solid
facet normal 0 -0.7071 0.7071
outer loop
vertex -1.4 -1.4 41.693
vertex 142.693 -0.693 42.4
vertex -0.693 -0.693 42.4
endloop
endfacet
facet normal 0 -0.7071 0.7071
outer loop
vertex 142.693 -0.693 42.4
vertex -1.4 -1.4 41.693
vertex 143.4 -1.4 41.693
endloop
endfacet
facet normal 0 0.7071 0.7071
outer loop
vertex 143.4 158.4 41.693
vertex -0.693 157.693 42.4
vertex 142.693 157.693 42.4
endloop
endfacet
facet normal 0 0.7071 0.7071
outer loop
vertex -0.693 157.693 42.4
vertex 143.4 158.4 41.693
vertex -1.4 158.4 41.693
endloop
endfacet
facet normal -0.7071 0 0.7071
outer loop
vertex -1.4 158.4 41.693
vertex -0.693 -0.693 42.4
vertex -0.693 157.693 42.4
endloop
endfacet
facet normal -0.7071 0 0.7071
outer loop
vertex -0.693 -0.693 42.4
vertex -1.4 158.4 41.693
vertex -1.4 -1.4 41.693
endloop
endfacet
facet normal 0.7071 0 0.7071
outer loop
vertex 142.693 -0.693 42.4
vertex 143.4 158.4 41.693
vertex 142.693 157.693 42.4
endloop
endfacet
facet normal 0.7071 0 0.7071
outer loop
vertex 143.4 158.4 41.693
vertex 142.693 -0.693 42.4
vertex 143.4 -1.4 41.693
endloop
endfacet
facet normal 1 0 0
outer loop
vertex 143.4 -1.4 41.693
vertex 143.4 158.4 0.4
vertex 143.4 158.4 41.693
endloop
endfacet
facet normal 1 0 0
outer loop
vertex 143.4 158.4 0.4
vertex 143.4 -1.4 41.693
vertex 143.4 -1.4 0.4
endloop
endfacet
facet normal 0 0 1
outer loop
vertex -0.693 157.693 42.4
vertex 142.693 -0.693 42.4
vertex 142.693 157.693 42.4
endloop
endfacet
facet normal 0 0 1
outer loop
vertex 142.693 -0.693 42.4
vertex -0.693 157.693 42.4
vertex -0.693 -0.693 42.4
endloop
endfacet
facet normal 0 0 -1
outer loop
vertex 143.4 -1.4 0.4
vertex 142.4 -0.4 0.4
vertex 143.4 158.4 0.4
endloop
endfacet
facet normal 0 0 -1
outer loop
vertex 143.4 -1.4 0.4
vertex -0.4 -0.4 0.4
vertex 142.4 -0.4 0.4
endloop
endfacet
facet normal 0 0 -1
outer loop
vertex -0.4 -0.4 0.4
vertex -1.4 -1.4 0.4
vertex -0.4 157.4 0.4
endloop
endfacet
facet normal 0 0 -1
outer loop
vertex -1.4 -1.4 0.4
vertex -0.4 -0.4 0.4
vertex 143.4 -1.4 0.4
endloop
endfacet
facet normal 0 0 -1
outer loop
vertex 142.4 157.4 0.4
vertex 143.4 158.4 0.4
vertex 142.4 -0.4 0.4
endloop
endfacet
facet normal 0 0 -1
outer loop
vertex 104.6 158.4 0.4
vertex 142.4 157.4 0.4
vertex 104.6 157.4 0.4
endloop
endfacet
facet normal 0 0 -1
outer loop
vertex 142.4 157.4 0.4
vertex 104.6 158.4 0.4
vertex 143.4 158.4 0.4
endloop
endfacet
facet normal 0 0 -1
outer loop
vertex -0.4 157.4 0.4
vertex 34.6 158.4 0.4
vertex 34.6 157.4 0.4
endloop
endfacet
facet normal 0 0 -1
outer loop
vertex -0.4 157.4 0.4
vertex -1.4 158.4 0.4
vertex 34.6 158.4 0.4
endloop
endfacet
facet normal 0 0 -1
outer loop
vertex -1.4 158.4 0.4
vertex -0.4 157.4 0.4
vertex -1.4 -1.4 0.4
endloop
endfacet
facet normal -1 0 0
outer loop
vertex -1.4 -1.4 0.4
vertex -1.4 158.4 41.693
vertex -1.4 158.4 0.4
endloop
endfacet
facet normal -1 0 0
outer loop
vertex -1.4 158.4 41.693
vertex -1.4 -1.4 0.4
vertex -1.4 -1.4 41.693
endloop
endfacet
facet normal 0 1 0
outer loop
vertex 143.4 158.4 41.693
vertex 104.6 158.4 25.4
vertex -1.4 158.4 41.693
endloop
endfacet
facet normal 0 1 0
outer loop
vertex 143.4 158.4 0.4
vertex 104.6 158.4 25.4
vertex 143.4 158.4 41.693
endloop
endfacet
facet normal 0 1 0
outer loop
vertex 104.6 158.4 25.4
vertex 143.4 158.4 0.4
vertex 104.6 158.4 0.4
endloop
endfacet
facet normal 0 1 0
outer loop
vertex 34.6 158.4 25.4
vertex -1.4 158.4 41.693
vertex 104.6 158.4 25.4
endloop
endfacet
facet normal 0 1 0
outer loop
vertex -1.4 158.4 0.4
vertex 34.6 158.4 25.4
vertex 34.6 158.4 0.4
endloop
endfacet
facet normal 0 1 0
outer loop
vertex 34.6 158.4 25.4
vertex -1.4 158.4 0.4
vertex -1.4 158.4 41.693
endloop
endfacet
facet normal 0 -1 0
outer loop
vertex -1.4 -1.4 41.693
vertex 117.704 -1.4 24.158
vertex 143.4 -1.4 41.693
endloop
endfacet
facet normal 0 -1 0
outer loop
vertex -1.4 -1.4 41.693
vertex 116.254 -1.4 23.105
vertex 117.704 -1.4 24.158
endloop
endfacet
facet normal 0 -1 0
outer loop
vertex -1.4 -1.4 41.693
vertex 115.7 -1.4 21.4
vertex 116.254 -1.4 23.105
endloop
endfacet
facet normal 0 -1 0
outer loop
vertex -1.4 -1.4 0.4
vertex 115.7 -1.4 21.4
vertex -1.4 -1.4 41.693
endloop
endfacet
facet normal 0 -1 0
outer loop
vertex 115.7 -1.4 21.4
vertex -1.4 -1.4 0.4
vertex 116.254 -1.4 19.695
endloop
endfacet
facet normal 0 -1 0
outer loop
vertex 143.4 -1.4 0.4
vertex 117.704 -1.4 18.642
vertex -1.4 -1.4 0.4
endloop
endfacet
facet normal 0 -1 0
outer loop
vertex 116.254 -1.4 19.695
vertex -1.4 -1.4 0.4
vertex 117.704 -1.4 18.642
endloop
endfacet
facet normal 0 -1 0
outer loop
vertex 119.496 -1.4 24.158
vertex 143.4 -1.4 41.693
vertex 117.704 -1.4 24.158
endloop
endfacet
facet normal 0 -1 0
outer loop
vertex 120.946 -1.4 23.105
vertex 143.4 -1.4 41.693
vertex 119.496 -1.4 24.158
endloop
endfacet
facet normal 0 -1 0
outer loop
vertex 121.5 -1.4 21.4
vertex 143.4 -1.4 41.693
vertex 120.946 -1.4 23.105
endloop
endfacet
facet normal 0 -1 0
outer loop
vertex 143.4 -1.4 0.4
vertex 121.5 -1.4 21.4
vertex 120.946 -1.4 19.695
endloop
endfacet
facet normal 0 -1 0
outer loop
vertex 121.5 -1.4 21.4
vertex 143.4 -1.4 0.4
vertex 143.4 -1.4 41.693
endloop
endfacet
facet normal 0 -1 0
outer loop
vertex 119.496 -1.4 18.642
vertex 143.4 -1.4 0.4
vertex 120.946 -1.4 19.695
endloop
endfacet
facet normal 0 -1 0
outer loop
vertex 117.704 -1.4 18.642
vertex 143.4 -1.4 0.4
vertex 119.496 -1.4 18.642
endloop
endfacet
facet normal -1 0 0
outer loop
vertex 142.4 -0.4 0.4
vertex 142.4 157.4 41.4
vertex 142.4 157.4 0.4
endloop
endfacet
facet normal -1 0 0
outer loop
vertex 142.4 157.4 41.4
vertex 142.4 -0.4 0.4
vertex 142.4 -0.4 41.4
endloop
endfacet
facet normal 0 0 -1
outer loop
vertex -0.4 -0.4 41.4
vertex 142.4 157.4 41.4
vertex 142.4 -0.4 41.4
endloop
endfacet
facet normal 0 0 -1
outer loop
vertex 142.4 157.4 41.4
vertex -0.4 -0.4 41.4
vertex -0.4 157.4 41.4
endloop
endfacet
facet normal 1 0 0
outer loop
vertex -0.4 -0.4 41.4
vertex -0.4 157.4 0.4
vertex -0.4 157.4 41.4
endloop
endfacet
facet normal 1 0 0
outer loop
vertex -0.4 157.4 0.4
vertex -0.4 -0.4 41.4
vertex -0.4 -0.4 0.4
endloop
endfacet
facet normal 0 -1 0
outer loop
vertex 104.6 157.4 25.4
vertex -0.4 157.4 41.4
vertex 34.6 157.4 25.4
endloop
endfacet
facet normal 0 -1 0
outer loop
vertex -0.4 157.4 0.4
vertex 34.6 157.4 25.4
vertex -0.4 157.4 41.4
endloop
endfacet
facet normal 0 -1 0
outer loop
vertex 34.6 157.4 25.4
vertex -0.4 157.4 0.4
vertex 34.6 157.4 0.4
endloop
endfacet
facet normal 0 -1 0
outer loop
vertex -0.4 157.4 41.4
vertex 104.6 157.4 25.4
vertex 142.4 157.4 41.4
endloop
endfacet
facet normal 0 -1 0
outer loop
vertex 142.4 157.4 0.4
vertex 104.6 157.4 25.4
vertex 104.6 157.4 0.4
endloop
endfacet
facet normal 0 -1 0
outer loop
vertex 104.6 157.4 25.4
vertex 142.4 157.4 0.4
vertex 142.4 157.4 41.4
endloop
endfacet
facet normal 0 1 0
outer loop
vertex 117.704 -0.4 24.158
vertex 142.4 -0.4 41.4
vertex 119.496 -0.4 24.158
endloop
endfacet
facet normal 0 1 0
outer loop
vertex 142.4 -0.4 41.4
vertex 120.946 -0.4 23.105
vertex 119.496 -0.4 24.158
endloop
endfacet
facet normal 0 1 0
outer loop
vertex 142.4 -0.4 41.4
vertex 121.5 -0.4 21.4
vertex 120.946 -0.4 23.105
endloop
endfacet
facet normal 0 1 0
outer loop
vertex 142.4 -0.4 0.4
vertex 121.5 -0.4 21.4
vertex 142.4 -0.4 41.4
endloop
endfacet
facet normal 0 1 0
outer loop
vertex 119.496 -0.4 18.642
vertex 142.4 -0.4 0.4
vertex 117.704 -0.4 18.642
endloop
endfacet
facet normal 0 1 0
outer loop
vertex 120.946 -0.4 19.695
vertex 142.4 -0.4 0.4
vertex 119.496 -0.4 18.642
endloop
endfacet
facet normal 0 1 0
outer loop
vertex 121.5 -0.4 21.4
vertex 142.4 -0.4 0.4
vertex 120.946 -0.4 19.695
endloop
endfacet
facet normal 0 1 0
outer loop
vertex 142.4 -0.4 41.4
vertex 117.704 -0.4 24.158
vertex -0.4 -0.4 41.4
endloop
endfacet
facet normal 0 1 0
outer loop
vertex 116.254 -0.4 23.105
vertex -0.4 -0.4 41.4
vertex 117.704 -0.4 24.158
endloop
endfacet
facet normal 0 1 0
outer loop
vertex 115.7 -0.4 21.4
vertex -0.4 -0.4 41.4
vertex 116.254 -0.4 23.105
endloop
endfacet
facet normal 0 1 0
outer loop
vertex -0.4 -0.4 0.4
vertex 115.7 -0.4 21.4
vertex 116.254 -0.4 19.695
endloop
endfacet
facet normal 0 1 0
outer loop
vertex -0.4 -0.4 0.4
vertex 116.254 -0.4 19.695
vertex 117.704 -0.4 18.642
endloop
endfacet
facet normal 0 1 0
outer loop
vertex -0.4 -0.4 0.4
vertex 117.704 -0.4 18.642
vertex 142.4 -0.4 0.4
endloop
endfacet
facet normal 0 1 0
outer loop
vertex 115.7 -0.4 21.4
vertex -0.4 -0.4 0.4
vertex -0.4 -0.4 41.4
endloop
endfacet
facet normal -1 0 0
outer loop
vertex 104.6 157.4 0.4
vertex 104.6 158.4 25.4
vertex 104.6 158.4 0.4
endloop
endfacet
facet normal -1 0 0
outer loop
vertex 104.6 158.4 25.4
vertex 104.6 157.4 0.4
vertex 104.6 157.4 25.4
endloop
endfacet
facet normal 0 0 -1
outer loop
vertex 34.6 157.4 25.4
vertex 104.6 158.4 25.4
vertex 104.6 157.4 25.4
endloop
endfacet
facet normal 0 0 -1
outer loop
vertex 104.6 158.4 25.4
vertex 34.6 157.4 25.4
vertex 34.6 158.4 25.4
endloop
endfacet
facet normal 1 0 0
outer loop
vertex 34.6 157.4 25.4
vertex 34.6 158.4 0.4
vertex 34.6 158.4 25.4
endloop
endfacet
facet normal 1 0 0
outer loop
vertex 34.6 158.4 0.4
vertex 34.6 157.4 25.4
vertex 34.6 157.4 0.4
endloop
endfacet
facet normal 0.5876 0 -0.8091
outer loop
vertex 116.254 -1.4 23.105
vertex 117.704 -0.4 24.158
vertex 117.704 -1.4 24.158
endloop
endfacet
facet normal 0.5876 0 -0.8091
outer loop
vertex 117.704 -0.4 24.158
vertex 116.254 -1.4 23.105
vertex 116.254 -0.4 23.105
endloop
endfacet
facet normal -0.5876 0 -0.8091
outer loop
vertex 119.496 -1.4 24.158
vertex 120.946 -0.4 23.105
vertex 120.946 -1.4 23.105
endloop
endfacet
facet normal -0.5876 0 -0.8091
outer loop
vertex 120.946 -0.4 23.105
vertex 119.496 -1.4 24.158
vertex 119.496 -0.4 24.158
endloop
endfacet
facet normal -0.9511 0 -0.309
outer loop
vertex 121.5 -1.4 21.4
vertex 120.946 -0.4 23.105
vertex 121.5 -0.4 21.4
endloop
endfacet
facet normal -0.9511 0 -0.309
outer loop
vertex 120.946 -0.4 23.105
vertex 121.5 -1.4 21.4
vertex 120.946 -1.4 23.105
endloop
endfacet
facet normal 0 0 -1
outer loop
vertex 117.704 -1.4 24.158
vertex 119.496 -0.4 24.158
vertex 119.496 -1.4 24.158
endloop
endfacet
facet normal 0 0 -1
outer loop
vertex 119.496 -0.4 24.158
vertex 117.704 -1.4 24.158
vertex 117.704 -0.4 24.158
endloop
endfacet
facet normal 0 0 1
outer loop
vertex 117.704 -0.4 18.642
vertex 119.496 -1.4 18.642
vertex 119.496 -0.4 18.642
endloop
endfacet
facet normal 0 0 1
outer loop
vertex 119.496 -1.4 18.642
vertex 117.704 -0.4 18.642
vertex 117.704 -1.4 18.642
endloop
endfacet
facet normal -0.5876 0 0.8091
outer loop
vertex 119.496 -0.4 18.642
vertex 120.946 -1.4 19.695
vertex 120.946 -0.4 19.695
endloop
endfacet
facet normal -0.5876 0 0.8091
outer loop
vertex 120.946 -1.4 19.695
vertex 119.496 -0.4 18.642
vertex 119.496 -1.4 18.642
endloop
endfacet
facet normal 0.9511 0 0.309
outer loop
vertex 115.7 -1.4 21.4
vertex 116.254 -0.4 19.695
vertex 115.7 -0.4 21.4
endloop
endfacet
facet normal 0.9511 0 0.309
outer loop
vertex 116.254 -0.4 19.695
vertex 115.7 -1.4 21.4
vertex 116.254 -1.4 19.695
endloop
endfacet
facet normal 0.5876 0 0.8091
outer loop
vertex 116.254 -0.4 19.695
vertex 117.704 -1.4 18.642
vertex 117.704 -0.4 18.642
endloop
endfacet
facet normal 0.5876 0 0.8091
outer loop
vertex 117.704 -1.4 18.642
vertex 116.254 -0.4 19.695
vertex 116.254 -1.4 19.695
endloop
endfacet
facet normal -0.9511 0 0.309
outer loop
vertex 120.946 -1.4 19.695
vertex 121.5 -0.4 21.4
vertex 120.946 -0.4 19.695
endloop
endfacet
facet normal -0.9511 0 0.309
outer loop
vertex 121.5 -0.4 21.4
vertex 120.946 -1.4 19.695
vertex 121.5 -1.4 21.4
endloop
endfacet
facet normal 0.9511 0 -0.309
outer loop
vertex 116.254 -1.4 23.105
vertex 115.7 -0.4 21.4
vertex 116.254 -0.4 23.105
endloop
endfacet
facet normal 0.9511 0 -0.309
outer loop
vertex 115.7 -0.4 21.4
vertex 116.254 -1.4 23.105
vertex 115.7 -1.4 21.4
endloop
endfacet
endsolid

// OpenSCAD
// [FL_INDEX: keywords="openscad, 3d_parametric, Free_Range_Printer_Raspberry_Pi_Box, csg_solid" | COT="Parametric OpenSCAD design from 3DCodeverse"]
// Title: Free Range Printer Raspberry Pi Box

// Rasperry Pi Free Range / Epson TM-T88 printer stand
//
// Box for holding Raspberry Pi under an Epson TM-T88 receipt printer or similar
// Customizable.
//
// (c) 2014, Laird Popkin laird@popk.in
//


/* [Hidden] */

piWidth = 56;
piLen = 85;
piHeight = 20;
piStandHeight = 5;
piThick = 2;

screwD = 2.9;
screwR = screwD/2;
standR = screwR+2;

sy1 = 25.5;
sx1 = 18;
sy2 = piLen-5;
sx2 = piWidth-12.5;

/* [Parameters] */

// Part to render
part = 2; //[0:Assemble, 1:Base, 2:Top]
// Width in mm
printerWidth = 140;
// Length in mm
printerLen = 155;
// Cable Gap in mm
cableGap = 10;
// Want an LED hole?
haveLED = 1; //[0:No LED, 1:LED]
// LED diameter
ledD = 5;
ledR = ledD/2;
// Does the Pi have standoff holes? Older ones don't.
piStandoffs = 0; //[1:Standoffs, 0:No standoffs]

// compute pi offsets from edge (box width - pi width, etc.)

piWOffset = (printerWidth - piWidth)/2;
piLOffset = (printerLen - piLen)/2;

// Height of stand in mm
height = 40;
// Thickness of walls in mm
thick = 1;
// Gap between inner and outer wall, should be fairly loose
gap = 0.4;

clipHeight = piStandHeight+thick+piThick;

module base() {
	difference() {
		cube([printerWidth+2*thick,printerLen+2*thick,height+thick]);
		translate([thick,thick,thick]) cube([printerWidth, printerLen, height+thick]);
		translate([printerWidth/2+thick, printerLen, height-cableGap/2])
			cube([printerWidth/2, 10, height], center=true);
		translate([-thick-gap,-thick-gap,gap]) led();
		rotate([45,0,0]) translate([-1,-thick/2,-thick/2]) cube([printerWidth+2*thick+2*gap+2,thick,thick]);
		translate([0,printerLen+2*thick,0]) rotate([45,0,0]) translate([-1,-thick/2,-thick/2]) cube([printerWidth+2*thick+2*gap+2,thick,thick]);
		rotate([0,45,0]) translate([-thick/2,-1,-thick/2]) cube([thick,printerLen+2*thick+2*gap+2,thick]);
		translate([printerWidth+2*thick,0,0]) rotate([0,45,0]) translate([-thick/2,-1,-thick/2]) cube([thick,printerLen+2*thick+2*gap+2,thick]);
		}
	translate([piWOffset,piLOffset,thick]) {
		cube([piWidth,piLen,thick]);
		difference() {
			union() {
				translate([-thick,-thick,0]) cube([10,10,clipHeight]);
				translate([-thick,piLen-10+thick,0]) cube([10,10,clipHeight]);
				translate([piWidth+thick-2,-thick,0]) cube([4,10,clipHeight]);
				translate([piWidth+thick-2,piLen-10+thick,0]) cube([4,10,clipHeight]);
				}
			translate([0,0,piStandHeight]) cube([piWidth,piLen,piThick]);
			translate([thick,thick,0]) cube([piWidth-2*thick,piLen-2*thick,10]);
			}
		translate([sx1,sy1,0]) standoff();
		translate([sx2,sy2,0]) standoff();
		}
	difference() {
		translate([-thick-gap,-thick-gap,gap]) ledTube();
		translate([-thick-gap,-thick-gap,gap]) led();
		}
	}

// goes below pi to hold it up
module standoff() {
	if (piStandoffs) {
		cylinder(r=screwR,h=piStandHeight+5);
		cylinder(r=standR,h=piStandHeight);
		}
	}

// goes on top of pi to hold it down (onto standoffs)
module standon() {
	if (piStandoffs) {
		difference() {
			translate([0,0,piStandHeight+piThick]) cylinder(r=standR,h=height-piStandHeight+2*gap-piThick);
			cylinder(r=screwR+gap,h=height);
			}
		}
	}

module led() {
	if (haveLED) {
		translate([printerWidth-height/2,0,height/2+thick])
			rotate([90,0,0]) cylinder(r=ledR+gap, h=20, center=true);
		}
	}

module ledTube() {
	if (haveLED) {
		translate([printerWidth-height/2,8+thick+gap,height/2+thick]) {
			rotate([90,0,0]) cylinder(r=ledR+gap+thick, h=8, center=false);
			translate([-thick/2,-8,-height/2-thick]) cube([thick,8,height/2]);
			}
		}
	}

module cover() {
	translate([-thick-gap,-thick-gap,gap]) difference() {
		cube([printerWidth+4*thick+2*gap,printerLen+4*thick+2*gap,height+2*thick]);
		translate([thick,thick,-1]) cube([printerWidth+2*thick+2*gap, printerLen+2*thick+2*gap, height+thick+1]);
		translate([printerWidth/2+thick, printerLen, cableGap/2])
			cube([printerWidth/2, 10, height], center=true);
		led();
		translate([0,0,height+2*thick]) {
			rotate([45,0,0]) translate([-1,-thick/2,-thick/2]) cube([printerWidth+4*thick+4*gap+2,thick,thick]);
			translate([0,printerLen+4*thick+2*gap,0]) rotate([45,0,0]) translate([-1,-thick/2,-thick/2]) cube([printerWidth+4*thick+4*gap+2,thick,thick]);
			rotate([0,45,0]) translate([-thick/2,-1,-thick/2]) cube([thick,printerLen+4*thick+4*gap+2,thick]);
			translate([printerWidth+4*thick+2*gap,0,0]) rotate([0,45,0]) translate([-thick/2,-1,-thick/2]) cube([thick,printerLen+4*thick+4*gap+2,thick]);
			}
		}
	translate([piWOffset,piLOffset,thick]) {
		//cube([piWidth,piLen,thick]);
		translate([sx1,sy1,0]) standon();
		translate([sx2,sy2,0]) standon();
		}
	}

if ((part==0) || (part==1)) base();
if ((part==0) || (part==2)) cover();
